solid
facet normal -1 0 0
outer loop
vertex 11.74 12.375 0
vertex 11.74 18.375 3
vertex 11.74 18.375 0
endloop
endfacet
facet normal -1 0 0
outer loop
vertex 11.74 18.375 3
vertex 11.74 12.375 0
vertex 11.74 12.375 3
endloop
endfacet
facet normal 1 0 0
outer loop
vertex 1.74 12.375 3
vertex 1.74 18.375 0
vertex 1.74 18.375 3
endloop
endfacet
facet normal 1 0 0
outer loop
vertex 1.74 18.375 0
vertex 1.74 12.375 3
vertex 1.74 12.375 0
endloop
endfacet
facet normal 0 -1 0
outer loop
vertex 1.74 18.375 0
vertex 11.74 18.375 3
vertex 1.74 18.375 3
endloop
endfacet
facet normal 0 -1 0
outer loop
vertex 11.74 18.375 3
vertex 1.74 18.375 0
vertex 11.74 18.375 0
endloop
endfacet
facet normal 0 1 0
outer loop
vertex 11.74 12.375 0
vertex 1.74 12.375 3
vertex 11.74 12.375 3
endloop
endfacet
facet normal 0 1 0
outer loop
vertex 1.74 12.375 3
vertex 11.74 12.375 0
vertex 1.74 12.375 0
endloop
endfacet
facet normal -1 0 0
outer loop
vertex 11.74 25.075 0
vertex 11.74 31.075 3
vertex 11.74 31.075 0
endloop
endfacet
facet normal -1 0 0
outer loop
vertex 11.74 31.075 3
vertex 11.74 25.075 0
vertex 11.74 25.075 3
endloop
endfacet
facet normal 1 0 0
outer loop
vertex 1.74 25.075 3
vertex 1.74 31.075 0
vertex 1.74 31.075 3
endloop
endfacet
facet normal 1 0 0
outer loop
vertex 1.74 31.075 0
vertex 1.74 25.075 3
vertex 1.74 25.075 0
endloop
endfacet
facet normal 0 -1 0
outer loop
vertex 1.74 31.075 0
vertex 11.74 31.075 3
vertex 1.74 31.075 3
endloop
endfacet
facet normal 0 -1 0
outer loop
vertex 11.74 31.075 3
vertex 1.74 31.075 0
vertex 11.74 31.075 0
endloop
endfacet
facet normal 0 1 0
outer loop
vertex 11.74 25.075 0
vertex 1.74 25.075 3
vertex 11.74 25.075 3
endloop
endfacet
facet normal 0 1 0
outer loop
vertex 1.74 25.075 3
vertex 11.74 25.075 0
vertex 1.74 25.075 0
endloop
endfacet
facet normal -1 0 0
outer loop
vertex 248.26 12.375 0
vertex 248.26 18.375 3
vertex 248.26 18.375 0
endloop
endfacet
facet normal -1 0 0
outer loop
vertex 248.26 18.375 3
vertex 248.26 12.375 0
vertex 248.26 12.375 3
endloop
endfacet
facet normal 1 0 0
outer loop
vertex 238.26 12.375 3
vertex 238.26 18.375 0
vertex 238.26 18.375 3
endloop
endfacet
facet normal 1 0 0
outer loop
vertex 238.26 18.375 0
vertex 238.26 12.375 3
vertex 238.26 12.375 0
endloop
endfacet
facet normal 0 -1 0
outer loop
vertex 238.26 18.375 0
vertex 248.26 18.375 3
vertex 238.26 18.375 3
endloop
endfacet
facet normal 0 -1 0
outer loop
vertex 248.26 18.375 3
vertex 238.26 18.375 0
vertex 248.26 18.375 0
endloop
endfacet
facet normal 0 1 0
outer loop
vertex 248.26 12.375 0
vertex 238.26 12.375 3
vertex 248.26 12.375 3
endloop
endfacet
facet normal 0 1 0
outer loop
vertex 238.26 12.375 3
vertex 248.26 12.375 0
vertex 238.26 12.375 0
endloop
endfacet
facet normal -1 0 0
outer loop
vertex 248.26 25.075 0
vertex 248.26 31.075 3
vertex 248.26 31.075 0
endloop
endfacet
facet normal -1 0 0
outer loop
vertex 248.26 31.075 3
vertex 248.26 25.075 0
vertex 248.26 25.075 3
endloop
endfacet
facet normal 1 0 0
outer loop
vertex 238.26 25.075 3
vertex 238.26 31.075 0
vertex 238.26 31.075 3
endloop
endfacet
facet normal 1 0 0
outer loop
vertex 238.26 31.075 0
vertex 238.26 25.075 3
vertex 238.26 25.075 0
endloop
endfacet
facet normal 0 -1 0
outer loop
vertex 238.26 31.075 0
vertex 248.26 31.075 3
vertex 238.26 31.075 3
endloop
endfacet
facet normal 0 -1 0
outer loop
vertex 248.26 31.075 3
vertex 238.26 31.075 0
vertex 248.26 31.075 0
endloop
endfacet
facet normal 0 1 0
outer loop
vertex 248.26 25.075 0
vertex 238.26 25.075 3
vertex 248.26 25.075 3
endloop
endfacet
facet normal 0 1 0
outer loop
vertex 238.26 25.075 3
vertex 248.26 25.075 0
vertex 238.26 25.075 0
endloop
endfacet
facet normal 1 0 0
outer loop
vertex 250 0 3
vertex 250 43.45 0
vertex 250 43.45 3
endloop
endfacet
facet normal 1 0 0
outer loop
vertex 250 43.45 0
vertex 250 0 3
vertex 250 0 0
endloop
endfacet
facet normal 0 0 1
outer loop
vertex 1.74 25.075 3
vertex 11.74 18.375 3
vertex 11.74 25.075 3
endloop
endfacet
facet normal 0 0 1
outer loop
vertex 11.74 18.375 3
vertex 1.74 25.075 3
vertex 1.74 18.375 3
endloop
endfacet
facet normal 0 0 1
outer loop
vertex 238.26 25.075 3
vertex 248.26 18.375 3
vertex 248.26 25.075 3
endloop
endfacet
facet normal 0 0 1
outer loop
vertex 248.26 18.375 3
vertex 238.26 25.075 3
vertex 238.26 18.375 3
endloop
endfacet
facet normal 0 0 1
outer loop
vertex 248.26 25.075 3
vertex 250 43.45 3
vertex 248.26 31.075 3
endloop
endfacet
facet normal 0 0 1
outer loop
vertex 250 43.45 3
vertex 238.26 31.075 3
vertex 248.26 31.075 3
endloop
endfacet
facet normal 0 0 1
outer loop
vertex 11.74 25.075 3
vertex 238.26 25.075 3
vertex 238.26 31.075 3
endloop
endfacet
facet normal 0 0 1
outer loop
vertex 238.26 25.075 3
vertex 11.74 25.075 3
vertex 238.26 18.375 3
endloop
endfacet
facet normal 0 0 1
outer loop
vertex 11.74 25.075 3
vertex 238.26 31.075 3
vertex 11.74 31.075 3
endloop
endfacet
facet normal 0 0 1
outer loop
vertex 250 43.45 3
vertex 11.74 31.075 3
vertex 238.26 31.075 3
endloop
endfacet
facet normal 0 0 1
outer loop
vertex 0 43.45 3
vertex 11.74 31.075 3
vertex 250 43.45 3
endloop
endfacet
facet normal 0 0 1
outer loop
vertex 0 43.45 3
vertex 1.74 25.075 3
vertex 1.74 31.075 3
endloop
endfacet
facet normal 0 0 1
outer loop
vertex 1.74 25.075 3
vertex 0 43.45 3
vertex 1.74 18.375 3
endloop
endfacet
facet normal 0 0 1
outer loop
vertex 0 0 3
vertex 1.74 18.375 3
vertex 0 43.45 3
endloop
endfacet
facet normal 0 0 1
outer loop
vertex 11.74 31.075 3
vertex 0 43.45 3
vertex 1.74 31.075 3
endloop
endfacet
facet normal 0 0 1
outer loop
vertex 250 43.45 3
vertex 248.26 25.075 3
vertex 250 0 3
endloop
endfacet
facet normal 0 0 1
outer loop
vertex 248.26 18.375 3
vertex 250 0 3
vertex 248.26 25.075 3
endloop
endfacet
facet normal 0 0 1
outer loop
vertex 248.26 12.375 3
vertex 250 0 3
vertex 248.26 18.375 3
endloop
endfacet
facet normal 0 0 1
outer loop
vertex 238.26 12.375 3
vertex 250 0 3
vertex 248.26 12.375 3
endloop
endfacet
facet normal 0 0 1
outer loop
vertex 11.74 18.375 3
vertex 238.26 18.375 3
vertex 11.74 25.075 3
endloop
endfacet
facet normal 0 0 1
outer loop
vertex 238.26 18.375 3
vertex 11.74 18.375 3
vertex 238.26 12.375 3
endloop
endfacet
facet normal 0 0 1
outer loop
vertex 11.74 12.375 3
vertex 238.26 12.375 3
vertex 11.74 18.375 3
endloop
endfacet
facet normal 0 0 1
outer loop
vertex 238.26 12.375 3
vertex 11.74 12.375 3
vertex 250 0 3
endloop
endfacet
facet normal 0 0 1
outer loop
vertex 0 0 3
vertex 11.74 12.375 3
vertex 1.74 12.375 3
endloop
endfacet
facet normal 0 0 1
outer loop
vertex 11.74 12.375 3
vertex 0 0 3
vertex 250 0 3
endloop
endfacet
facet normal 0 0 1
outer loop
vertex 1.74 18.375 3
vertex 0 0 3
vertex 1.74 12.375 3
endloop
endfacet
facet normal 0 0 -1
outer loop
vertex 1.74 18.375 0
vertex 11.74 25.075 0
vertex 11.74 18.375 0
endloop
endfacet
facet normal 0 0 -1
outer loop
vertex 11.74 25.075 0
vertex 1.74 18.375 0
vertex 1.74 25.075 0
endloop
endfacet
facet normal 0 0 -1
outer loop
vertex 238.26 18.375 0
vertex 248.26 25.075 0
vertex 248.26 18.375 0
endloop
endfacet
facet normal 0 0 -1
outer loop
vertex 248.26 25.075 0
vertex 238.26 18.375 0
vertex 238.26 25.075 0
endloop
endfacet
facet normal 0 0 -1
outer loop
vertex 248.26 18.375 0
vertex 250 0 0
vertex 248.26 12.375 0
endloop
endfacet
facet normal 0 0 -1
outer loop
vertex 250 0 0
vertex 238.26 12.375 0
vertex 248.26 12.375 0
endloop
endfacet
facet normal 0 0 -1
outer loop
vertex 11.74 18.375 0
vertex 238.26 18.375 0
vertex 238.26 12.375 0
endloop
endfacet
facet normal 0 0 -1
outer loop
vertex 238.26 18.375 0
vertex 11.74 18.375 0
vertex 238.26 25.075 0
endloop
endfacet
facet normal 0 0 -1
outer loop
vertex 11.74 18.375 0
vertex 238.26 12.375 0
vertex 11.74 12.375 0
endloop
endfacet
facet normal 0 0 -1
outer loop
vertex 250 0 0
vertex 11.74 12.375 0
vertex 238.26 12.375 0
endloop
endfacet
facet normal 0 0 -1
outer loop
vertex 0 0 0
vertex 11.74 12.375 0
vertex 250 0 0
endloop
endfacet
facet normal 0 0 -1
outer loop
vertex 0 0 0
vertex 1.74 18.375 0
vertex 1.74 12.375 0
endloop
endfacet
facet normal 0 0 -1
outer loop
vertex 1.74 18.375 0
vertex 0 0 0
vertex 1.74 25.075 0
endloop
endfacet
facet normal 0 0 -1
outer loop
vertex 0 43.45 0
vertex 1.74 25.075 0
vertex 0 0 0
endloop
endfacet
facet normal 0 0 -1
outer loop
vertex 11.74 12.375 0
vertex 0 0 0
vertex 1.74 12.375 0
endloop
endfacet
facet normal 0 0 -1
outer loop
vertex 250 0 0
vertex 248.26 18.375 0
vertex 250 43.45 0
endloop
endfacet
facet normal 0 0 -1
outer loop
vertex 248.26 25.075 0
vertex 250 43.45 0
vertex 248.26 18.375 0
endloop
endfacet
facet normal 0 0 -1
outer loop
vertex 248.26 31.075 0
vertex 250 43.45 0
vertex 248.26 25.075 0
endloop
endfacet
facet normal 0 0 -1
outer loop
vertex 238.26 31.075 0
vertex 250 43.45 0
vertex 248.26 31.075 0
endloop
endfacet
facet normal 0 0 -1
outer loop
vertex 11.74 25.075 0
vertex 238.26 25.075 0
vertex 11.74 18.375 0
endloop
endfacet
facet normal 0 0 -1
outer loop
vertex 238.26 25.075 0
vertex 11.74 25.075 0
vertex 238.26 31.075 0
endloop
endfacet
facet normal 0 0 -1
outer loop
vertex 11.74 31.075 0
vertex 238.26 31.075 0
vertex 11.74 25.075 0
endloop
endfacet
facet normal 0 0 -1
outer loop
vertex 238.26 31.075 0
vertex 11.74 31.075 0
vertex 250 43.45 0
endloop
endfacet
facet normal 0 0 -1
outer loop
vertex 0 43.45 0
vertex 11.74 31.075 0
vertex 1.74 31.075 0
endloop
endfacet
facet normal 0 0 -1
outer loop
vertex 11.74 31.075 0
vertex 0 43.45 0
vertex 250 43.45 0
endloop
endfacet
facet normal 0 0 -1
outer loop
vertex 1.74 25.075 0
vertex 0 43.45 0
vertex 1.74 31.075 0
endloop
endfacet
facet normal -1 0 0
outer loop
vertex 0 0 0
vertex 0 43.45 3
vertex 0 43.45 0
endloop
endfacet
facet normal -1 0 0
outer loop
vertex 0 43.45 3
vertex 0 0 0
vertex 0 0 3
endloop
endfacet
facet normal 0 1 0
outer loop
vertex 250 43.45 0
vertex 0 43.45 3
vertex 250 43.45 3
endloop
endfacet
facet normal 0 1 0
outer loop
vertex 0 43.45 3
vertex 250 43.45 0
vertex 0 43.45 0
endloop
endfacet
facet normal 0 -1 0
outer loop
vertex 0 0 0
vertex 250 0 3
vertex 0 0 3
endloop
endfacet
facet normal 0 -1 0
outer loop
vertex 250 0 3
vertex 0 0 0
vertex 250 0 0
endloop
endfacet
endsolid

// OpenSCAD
// TL1_Plate_1U_Shifted_0p5U
// Homelab Rack CAD Standard v1.0 - millimeters
// Mount positions provisional: test-fit against DeskPi TL1 rail!
plate_width=250;
plate_height=43.45;
plate_thickness=3;
slot_width=10;
slot_height=6;
slot_x=[6.74,243.26];
slot_y=[15.375,28.075];
difference() {
  cube([plate_width,plate_height,plate_thickness]);
  for (x=slot_x) for (y=slot_y)
    translate([x-slot_width/2,y-slot_height/2,-0.5])
      cube([slot_width,slot_height,plate_thickness+1]);
}
